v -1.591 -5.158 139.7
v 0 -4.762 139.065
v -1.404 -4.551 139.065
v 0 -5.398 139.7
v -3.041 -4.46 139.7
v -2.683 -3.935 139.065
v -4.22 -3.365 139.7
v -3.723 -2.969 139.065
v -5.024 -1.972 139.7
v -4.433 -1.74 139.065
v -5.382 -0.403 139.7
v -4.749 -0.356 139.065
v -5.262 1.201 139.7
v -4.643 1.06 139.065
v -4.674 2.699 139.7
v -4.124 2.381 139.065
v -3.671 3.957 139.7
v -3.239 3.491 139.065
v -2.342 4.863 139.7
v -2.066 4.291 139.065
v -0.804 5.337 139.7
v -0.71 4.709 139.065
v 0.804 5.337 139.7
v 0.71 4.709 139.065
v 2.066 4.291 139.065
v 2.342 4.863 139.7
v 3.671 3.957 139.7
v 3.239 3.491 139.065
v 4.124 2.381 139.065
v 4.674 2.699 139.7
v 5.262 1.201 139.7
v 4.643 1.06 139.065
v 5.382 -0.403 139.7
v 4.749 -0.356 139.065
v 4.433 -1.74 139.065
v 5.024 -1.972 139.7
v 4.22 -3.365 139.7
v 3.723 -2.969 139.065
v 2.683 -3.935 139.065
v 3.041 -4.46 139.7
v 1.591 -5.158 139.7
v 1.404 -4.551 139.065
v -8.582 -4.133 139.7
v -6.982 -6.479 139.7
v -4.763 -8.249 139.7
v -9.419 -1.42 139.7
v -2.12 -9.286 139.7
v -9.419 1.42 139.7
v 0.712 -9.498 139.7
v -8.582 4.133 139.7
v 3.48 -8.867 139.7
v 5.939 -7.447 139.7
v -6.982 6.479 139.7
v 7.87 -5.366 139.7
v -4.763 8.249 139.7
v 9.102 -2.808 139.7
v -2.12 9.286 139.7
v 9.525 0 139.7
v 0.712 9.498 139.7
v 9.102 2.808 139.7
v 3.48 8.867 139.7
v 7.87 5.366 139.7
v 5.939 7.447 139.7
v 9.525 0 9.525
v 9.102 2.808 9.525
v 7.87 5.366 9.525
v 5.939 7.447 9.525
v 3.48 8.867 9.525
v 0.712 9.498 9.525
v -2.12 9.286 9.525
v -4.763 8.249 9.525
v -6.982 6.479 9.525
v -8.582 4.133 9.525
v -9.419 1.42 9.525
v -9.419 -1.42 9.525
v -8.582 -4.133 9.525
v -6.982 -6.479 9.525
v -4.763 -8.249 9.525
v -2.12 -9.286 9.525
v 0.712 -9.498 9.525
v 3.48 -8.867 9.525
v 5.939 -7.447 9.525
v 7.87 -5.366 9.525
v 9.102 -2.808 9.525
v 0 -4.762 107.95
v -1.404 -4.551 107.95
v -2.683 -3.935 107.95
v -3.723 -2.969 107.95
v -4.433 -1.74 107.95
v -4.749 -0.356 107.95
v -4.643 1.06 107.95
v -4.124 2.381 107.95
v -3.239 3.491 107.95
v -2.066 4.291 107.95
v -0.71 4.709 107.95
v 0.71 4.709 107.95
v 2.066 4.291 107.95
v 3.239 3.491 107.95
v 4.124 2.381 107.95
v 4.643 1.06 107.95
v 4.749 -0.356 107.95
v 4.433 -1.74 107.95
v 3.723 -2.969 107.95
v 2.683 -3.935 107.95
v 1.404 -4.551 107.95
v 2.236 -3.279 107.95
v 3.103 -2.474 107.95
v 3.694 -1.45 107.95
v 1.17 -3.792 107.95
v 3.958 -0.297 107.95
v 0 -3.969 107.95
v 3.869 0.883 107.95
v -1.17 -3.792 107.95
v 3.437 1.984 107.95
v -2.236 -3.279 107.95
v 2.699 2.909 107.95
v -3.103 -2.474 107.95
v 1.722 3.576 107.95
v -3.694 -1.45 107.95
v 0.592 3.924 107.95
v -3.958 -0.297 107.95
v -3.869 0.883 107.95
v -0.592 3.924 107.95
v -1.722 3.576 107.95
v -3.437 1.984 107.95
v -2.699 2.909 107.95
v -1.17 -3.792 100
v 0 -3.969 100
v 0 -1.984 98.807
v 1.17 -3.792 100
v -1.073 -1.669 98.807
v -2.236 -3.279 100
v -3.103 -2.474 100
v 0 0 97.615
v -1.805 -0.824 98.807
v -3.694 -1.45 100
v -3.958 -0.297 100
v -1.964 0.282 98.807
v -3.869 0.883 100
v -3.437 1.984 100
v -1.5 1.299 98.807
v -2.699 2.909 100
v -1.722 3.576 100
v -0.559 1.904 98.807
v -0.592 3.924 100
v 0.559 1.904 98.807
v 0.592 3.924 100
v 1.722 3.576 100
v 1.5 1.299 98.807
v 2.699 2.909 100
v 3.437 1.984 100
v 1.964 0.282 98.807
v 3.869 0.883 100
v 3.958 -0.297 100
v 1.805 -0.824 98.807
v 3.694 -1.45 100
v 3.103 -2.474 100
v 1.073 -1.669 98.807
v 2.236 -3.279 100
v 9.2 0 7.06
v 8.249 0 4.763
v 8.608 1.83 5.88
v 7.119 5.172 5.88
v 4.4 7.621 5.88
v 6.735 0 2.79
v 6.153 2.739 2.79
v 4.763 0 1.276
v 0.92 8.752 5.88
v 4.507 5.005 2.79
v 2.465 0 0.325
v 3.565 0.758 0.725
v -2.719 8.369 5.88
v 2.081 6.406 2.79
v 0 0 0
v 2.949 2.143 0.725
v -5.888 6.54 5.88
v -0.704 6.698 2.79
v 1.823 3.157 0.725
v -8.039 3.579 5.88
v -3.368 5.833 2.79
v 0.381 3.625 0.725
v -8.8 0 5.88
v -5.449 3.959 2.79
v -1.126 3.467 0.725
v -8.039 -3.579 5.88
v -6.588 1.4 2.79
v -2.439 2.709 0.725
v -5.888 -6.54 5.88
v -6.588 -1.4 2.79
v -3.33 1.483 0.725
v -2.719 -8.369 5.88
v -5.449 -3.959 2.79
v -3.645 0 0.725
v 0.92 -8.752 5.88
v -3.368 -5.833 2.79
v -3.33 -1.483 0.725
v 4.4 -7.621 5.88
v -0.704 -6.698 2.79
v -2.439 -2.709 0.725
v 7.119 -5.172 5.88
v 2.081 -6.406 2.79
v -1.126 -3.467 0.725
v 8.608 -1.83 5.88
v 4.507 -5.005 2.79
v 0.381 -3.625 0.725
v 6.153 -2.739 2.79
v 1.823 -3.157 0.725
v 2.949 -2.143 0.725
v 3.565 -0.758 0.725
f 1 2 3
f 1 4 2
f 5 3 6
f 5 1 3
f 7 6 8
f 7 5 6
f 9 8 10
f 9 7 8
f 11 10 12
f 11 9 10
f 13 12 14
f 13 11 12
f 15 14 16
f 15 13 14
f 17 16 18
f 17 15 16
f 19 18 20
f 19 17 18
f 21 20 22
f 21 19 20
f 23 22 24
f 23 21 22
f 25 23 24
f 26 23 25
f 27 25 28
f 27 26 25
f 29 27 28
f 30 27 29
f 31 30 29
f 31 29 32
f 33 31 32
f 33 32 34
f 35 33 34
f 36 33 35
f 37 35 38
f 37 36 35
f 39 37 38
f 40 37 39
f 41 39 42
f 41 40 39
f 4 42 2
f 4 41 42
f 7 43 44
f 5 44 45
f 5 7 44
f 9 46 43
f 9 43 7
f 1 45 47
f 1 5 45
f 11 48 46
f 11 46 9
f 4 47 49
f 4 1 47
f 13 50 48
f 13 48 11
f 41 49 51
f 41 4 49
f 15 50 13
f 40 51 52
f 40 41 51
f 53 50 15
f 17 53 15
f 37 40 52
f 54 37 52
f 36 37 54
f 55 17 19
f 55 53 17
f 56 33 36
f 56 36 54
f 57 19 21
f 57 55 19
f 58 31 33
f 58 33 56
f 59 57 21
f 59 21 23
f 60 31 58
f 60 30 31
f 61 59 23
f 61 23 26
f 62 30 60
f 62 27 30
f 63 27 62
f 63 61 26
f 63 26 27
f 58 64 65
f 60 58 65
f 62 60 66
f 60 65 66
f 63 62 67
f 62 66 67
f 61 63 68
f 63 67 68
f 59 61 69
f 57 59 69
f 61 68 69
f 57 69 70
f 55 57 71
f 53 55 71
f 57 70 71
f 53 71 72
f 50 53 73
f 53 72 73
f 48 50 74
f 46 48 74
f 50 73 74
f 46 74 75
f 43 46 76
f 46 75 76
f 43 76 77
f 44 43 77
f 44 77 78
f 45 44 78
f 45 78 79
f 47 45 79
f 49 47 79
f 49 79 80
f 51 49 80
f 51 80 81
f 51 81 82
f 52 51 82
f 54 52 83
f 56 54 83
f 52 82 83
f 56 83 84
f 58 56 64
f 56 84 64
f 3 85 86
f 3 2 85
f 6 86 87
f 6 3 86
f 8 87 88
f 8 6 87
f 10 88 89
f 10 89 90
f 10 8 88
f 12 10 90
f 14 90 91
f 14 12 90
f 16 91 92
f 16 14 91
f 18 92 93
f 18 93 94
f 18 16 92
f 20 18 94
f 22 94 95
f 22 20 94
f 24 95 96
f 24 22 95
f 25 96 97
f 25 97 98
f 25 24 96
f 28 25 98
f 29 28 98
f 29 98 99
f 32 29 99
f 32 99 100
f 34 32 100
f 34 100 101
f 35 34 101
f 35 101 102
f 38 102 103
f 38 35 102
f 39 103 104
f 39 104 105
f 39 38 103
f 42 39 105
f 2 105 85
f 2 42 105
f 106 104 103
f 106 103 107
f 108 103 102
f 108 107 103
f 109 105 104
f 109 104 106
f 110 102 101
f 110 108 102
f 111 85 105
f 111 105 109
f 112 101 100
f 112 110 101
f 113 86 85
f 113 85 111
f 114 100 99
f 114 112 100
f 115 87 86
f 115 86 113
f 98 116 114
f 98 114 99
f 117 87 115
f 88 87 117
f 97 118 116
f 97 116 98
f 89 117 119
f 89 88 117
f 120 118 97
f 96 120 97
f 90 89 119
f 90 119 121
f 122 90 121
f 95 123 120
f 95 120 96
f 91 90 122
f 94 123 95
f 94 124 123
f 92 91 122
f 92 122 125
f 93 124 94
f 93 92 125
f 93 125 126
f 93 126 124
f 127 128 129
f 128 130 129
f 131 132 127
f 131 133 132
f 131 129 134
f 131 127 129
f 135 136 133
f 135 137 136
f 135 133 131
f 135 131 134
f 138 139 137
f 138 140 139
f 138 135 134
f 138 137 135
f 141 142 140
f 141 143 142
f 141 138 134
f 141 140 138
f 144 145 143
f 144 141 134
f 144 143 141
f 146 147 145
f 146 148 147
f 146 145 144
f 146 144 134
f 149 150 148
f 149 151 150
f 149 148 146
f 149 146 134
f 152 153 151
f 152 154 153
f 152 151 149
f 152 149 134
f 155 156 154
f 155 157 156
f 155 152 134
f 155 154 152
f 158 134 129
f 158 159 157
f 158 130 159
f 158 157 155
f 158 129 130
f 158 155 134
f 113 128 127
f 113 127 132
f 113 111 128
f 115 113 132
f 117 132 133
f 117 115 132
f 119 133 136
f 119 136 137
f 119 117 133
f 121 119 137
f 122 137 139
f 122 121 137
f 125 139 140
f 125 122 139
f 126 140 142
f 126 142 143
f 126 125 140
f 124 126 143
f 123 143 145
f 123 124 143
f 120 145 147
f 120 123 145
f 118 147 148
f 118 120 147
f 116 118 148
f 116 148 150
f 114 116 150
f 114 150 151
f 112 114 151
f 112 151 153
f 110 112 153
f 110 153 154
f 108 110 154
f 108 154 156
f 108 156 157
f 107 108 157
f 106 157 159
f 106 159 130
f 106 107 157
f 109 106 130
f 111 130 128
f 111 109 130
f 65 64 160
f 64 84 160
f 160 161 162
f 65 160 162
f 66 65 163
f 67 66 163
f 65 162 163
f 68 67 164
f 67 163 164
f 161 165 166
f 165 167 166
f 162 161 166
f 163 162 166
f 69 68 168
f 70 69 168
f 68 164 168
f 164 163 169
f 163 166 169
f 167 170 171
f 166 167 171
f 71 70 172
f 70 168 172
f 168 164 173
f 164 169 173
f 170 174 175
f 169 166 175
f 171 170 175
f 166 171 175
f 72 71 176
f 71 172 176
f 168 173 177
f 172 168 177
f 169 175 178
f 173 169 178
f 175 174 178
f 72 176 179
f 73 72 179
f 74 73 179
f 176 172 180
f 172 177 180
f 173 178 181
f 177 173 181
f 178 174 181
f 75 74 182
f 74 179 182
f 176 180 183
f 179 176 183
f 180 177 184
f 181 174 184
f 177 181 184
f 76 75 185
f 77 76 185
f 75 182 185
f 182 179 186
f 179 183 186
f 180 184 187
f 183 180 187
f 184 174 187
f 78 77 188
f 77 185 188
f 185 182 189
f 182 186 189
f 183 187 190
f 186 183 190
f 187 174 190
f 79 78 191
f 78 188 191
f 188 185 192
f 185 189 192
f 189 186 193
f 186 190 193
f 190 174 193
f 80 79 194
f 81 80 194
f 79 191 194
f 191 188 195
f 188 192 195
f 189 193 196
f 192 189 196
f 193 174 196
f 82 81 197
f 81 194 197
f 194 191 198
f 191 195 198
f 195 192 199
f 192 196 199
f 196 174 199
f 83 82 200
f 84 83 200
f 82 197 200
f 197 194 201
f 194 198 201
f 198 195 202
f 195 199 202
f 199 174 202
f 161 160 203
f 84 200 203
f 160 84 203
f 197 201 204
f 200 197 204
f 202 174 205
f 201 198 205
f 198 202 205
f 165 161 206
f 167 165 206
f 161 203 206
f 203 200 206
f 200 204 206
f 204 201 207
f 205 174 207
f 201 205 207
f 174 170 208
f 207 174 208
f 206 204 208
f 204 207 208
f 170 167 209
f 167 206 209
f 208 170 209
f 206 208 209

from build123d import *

# Parameters (mm, degrees)
SKETCH1_R           = 9.525
BOSS_EXTRUDE1_DEPTH = 139.7
FILLET1_R           = 9.525


with BuildPart() as part:
    # Sketch1 → Boss-Extrude1 (new body)
    with BuildSketch(Plane.XY):
        Circle(SKETCH1_R)
    extrude(amount=BOSS_EXTRUDE1_DEPTH)

    # Fillet1
    fillet1_edges = [part.edges().sort_by_distance(p)[0] for p in [
        (-9.525, 0, 0),
    ]]
    fillet(fillet1_edges, radius=FILLET1_R)

    # Sketch2 → 3/8-16 Tapped Hole1 (revolve, cut)
    with BuildSketch(Plane(origin=(0, 0, 139.7), x_dir=(0, -1, 0), z_dir=(1, 0, 0))):
        Polygon((0, 0), (0, 42.084865582), (3.96875, 39.7002), (3.96875, 31.75), (4.7625, 31.75), (4.7625, 0.635), (5.3975, 0), align=None)
    revolve(axis=Axis((0, 0, 146.05), (0, 0, -1)), mode=Mode.SUBTRACT)


solid = part.part
